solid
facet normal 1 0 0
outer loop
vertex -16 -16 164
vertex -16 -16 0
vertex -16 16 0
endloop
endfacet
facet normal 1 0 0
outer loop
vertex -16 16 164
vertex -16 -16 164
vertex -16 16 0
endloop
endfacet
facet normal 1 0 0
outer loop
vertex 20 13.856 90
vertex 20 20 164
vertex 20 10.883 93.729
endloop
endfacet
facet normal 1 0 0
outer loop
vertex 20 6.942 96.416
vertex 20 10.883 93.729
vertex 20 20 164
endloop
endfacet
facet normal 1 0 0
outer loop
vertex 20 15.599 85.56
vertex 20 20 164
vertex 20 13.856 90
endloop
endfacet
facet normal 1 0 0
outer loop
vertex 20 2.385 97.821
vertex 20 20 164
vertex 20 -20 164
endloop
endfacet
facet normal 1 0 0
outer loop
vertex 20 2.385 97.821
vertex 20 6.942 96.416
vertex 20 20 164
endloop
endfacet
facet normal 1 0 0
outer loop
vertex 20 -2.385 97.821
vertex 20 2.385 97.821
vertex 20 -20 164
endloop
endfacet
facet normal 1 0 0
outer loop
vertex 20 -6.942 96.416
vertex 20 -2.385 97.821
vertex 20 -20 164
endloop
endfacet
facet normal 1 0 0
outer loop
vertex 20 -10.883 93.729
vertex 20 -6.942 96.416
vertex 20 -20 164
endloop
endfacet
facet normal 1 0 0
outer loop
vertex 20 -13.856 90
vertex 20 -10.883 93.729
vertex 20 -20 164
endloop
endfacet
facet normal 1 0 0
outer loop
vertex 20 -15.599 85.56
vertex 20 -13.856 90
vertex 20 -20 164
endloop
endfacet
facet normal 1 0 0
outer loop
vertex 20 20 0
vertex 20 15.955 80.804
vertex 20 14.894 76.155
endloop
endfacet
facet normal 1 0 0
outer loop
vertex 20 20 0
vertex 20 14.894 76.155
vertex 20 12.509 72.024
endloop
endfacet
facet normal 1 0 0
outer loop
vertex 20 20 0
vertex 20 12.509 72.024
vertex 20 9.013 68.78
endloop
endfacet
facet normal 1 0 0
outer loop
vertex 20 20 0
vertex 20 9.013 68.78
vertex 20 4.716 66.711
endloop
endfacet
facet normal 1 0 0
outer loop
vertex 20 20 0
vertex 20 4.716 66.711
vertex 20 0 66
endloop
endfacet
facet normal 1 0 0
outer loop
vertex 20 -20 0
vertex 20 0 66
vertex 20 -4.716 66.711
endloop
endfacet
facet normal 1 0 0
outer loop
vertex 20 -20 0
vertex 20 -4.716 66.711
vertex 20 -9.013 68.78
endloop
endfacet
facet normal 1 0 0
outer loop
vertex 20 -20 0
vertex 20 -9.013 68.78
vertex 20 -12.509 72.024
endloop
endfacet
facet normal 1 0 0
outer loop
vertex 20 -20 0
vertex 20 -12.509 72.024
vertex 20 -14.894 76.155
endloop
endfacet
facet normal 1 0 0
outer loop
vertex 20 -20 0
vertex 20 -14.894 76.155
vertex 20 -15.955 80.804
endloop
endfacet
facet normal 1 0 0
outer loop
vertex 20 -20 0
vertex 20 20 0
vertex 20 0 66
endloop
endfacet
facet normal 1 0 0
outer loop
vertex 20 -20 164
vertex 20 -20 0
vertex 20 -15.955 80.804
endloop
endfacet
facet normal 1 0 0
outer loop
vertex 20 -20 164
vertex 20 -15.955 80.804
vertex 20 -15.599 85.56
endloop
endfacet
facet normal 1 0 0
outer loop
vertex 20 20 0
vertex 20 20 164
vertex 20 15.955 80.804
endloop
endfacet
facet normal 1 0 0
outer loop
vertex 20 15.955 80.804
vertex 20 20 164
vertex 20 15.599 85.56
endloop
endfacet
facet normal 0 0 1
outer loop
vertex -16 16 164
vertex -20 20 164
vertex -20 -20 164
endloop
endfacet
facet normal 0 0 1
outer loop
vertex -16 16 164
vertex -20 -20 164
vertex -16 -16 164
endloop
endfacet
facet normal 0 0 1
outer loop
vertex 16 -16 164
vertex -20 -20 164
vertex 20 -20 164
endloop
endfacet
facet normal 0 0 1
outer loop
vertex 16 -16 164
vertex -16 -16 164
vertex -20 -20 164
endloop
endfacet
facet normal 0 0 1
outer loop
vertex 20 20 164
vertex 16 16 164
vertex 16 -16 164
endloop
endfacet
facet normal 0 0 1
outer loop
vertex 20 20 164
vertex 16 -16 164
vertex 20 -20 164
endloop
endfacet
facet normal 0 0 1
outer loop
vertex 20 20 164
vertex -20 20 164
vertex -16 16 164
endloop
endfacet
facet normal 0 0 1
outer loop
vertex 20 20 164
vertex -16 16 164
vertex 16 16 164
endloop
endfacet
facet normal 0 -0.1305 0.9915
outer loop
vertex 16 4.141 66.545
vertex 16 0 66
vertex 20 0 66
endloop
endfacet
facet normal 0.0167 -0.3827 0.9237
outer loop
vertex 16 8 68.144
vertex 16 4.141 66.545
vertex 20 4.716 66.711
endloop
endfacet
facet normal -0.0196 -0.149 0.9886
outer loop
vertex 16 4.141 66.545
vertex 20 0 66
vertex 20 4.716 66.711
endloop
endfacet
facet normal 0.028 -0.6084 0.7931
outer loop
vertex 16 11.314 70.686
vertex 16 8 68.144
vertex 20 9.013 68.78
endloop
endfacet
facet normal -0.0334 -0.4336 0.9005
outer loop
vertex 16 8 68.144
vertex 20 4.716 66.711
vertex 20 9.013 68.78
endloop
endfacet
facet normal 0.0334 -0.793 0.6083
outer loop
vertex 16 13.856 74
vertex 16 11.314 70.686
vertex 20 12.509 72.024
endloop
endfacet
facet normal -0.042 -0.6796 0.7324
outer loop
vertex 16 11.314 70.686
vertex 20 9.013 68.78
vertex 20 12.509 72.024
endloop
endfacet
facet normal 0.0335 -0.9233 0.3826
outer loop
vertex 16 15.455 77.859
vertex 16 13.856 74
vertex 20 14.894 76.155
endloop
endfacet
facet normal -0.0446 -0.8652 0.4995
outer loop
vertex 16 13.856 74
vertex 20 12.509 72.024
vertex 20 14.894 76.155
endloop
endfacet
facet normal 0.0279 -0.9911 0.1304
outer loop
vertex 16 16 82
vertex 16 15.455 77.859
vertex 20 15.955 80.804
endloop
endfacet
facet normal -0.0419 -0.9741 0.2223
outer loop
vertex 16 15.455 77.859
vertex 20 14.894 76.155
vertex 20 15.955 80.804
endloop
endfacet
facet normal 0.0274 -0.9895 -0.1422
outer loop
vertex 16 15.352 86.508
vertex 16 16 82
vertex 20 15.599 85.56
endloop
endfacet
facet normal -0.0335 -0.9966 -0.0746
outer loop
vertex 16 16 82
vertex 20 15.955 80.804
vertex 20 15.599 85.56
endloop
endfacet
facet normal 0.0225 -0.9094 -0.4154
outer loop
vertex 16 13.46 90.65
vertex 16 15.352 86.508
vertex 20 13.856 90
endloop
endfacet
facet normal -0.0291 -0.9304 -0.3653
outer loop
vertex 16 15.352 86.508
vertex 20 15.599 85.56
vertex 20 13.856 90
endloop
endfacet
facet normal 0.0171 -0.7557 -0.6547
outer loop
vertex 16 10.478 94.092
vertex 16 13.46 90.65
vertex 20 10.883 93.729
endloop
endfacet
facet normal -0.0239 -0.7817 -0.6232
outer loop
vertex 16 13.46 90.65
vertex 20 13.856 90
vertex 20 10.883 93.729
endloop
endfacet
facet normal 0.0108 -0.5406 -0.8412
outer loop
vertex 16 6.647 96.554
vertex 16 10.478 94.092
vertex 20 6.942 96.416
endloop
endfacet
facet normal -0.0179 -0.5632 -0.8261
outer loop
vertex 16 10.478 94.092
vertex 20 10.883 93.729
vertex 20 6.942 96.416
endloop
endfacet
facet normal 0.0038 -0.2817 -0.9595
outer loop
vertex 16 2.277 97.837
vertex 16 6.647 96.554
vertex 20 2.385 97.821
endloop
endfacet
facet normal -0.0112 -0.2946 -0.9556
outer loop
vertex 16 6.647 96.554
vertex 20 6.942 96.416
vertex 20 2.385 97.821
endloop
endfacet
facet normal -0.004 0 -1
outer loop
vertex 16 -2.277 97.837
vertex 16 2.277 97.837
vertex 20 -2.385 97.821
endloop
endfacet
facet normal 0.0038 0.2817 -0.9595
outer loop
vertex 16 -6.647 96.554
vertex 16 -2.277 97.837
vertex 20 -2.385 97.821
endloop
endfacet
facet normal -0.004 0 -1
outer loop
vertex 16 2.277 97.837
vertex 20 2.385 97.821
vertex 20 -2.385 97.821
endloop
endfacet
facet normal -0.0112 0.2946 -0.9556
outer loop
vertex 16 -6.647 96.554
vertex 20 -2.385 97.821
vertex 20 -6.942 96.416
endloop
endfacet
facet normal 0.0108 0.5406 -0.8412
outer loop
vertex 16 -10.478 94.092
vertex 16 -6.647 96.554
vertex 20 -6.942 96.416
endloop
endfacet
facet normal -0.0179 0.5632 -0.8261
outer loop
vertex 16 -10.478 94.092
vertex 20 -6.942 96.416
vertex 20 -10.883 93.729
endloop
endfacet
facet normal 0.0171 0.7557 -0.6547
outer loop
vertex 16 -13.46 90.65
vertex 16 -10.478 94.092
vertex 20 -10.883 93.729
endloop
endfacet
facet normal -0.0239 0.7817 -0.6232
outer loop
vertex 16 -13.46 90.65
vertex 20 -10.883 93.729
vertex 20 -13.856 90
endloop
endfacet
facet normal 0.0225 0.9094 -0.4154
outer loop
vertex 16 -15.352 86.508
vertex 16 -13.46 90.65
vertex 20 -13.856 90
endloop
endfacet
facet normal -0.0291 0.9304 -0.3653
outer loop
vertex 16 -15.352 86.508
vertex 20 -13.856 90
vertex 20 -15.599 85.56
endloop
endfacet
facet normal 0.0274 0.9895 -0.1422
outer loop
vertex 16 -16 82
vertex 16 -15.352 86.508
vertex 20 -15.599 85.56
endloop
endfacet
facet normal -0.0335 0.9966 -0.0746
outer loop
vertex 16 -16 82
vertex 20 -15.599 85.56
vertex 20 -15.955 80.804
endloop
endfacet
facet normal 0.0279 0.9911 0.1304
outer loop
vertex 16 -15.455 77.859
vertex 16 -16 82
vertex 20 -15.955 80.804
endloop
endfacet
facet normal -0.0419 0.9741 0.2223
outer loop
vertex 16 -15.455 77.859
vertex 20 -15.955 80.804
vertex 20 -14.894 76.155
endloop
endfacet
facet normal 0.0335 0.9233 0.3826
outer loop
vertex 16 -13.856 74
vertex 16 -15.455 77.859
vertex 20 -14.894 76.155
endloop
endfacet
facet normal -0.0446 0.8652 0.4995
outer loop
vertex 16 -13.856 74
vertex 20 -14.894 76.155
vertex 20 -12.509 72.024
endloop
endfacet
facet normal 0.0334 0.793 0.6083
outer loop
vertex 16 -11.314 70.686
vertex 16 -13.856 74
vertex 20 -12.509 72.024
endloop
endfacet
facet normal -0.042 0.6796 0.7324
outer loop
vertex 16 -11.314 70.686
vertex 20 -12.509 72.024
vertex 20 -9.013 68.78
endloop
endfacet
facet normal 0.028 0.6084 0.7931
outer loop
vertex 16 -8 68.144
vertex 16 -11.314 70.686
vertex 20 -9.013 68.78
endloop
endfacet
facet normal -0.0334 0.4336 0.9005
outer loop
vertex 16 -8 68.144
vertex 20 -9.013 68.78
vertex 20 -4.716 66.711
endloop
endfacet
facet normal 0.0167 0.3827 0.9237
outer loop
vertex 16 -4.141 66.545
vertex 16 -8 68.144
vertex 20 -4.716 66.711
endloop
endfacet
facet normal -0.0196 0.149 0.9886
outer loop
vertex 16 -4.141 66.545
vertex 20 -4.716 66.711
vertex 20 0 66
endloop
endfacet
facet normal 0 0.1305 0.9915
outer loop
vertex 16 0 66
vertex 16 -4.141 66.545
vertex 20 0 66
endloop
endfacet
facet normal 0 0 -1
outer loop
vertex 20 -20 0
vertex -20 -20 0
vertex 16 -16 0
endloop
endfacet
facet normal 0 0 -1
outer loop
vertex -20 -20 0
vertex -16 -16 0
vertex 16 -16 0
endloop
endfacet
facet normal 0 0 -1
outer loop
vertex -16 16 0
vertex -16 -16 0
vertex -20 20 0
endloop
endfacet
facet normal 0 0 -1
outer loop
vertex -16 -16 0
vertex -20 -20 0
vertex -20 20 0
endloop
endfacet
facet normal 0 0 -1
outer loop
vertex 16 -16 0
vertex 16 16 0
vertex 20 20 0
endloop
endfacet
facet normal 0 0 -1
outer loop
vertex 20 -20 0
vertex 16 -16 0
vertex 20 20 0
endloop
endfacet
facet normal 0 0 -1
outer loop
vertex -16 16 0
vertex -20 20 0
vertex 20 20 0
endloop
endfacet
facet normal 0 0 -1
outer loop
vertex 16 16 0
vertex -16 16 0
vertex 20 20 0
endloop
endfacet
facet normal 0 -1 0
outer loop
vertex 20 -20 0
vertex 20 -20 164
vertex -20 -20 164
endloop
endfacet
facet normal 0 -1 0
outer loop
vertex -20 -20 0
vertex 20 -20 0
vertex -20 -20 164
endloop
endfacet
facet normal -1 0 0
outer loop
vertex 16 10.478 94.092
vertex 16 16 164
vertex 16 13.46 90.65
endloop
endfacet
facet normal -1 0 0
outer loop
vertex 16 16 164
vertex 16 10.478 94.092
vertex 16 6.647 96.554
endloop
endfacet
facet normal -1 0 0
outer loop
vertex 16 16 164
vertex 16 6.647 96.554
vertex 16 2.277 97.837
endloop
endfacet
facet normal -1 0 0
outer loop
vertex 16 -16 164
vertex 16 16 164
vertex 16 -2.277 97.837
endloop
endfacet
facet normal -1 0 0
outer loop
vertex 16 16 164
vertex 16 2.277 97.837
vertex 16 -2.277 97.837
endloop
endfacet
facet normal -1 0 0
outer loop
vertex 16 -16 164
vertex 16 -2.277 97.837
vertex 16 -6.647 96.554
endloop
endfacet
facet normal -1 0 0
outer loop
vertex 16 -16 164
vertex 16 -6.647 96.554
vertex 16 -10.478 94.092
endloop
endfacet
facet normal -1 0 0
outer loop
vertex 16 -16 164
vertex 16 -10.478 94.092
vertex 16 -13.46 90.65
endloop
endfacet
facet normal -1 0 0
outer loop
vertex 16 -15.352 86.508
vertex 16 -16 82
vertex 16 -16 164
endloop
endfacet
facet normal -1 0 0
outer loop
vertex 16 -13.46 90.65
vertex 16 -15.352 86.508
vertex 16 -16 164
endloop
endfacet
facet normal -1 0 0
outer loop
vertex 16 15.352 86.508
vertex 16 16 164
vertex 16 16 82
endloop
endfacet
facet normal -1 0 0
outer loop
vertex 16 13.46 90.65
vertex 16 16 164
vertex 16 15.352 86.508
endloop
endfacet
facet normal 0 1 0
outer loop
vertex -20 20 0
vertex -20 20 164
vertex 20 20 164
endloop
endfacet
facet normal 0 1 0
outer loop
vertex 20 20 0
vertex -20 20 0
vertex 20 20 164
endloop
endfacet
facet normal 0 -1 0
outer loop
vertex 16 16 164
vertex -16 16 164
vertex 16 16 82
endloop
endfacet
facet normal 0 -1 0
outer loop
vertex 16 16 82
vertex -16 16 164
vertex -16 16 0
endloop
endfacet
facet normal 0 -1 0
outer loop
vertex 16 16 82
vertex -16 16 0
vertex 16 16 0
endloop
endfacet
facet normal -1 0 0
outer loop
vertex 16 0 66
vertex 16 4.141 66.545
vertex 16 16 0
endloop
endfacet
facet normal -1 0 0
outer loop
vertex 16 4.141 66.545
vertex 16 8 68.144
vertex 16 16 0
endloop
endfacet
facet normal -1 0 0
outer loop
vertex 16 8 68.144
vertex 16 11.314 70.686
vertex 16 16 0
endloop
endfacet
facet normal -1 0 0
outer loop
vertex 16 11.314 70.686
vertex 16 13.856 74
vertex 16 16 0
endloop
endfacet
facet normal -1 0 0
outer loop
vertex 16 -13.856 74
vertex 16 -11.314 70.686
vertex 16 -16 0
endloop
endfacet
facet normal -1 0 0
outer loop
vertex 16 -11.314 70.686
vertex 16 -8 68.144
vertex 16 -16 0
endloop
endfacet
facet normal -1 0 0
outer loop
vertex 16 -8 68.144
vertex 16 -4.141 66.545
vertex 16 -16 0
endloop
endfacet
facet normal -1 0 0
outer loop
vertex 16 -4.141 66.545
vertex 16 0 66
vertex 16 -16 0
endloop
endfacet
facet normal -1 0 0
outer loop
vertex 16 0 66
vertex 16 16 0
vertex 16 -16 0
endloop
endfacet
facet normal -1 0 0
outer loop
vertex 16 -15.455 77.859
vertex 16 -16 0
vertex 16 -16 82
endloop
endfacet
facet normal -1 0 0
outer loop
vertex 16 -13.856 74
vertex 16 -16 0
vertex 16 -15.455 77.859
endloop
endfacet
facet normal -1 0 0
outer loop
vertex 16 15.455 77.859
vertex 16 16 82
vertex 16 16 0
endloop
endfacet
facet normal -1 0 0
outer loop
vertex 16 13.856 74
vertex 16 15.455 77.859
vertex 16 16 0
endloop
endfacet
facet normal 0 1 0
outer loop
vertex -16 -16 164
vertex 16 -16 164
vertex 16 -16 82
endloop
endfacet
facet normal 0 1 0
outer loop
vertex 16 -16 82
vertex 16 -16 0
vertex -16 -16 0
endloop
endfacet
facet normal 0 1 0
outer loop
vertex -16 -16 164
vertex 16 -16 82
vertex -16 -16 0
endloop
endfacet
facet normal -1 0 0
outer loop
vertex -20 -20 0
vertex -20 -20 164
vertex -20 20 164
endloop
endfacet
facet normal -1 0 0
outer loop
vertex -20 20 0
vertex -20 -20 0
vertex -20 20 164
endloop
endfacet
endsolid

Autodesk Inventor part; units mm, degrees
ref_plane "YZ Plane" through (0, 0, 0) normal (1, 0, 0) x (0, 1, 0)
ref_plane "XZ Plane" through (0, 0, 0) normal (0, 1, 0) x (-1, 0, 0)
ref_plane "XY Plane" through (0, 0, 0) normal (0, 0, 1) x (1, 0, 0)
sketch "Boceto1" plane through (0, 0, 0) normal (0, 0, 1) x (1, 0, 0)
  line L0 (-20, 20) -> (20, 20)
  line L1 (20, 20) -> (20, -20)
  line L2 (20, -20) -> (-20, -20)
  line L3 (-20, -20) -> (-20, 20)
  line L4 (-20, 20) -> (20, -20) construction
  line L5 (-16, 16) -> (16, 16)
  line L6 (16, 16) -> (16, -16)
  line L7 (16, -16) -> (-16, -16)
  line L8 (-16, -16) -> (-16, 16)
  line L9 (-16, 0) -> (-20, 0) construction
  line L10 (0, 16) -> (0, 20) construction
  line L11 (16, 0) -> (20, 0) construction
  line L12 (0, -16) -> (0, -20) construction
  point P0 (0, 0)
  point P1 (0, 0)
  dimension "d0" = 40
  dimension "d1" = 4
extrude "Extrusión1" add sketch "Boceto1" along normal blind 164
sketch "Boceto2" plane through (20, -20, 0) normal (1, 0, 0) x (0, 0, -1)
  line L0 (0, 20) -> (-164, 20)
  line L1 (-164, 36) -> (-164, 4) projected
  line L2 (0, 0) -> (0, 40) projected
  circle A0 centre (-82, 20) radius 16
  point P0 (0, 20)
  dimension "d4" = 32
extrude "Extrusión2" cut sketch "Boceto2" against normal up to surface (4 mm away)
properties part number "C_358_40_2"
